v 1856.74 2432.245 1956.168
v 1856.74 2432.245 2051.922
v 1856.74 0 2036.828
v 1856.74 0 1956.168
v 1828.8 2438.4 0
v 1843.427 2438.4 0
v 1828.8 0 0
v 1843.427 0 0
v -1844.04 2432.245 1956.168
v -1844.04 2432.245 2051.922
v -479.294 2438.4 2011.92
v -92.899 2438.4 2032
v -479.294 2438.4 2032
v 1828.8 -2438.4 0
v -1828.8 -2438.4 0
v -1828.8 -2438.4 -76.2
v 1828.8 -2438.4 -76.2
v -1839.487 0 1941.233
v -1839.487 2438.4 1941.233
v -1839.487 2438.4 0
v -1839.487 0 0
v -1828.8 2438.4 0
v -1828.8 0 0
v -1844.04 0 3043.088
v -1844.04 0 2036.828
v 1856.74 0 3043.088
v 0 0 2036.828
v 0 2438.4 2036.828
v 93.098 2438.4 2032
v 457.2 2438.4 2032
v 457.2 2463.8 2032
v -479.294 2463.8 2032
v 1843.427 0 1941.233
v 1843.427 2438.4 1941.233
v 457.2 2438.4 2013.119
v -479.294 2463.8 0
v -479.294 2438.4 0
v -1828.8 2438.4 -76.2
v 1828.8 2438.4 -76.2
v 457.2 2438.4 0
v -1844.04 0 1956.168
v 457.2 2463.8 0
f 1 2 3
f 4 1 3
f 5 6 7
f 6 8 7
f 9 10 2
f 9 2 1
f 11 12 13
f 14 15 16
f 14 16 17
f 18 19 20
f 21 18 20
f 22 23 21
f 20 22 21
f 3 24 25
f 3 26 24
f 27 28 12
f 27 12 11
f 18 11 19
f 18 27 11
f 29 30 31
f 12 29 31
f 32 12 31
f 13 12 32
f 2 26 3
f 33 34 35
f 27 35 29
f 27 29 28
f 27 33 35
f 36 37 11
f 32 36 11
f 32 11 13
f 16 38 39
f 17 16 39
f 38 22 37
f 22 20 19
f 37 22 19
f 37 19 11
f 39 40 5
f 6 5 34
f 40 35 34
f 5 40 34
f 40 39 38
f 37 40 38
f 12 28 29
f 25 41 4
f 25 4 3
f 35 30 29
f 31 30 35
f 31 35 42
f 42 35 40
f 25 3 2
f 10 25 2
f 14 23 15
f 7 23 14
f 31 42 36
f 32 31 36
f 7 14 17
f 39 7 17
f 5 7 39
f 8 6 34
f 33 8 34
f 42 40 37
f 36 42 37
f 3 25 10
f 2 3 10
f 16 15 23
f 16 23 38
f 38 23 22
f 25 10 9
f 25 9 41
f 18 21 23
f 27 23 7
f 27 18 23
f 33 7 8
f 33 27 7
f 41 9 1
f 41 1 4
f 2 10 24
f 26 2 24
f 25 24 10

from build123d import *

# Parameters (mm, degrees)
F2_DEPTH  = 2438.4
F4_DEPTH  = 1856.74
F5_DEPTH  = 1844.04
F8_DEPTH  = 3700.78
F9_W      = 936.4943000793
F9_H      = 90.7669610977
F10_DEPTH = 25.4
F0_W      = 3657.6
F0_H      = 4876.8
F11_DEPTH = 76.2


with BuildPart() as f2:
    # F1 (on Front) → F2 (new body)
    with BuildSketch(Plane.XZ):
        Polygon((-1839.4869565964, 0), (1843.4273004532, 0), (1843.4273004532, 1941.2330389023), (0, 2036.8278026581), (-1839.4869565964, 1941.2330389023), align=None)
    extrude(amount=-F2_DEPTH)

    # F9 (on face) → F10 (join)
    with BuildSketch(Plane(origin=(0, 2438.4, 0), x_dir=(-1, 0, 0), z_dir=(0, 1, 0))):
        Polygon((-457.2, 0), (0, 0), (479.2943000793, 0), (479.2943000793, 1941.2330389023), (-457.2, 1941.2330389023), align=None)
        with Locations((11.0471500397, 1986.6165194511)):
            Rectangle(F9_W, F9_H)
    extrude(amount=F10_DEPTH)

    # F0 (on Top) → F11 (join)
    with BuildSketch(Plane.XY):
        Rectangle(F0_W, F0_H)
    extrude(amount=-F11_DEPTH)


with BuildPart() as f4:
    # F3 (on Right) → F4 (new body)
    with BuildSketch(Plane.YZ):
        Polygon((0, 2036.8278026581), (2432.2454929352, 2051.9218444824), (0, 3043.0884361267), align=None)
    extrude(amount=F4_DEPTH)

    # F5 (add): a face of the model
    f5_faces = [f4.faces().sort_by_distance(p)[0] for p in [
        (0, 810.7484976451, 2377.2793610891),
    ]]
    extrude(f5_faces, amount=F5_DEPTH)


with BuildPart() as f8:
    # F6 (on face) → F8 (new body)
    with BuildSketch(Plane(origin=(-1844.04, 0, 0), x_dir=(0, -1, 0), z_dir=(-1, 0, 0))):
        Polygon((0, 2036.8278026581), (-2432.2454929352, 2051.9218444824), (-2432.2454929352, 1956.1679363251), (0, 1956.1679363251), align=None)
    extrude(amount=-F8_DEPTH)


solid = Compound([f2.part, f4.part, f8.part])
